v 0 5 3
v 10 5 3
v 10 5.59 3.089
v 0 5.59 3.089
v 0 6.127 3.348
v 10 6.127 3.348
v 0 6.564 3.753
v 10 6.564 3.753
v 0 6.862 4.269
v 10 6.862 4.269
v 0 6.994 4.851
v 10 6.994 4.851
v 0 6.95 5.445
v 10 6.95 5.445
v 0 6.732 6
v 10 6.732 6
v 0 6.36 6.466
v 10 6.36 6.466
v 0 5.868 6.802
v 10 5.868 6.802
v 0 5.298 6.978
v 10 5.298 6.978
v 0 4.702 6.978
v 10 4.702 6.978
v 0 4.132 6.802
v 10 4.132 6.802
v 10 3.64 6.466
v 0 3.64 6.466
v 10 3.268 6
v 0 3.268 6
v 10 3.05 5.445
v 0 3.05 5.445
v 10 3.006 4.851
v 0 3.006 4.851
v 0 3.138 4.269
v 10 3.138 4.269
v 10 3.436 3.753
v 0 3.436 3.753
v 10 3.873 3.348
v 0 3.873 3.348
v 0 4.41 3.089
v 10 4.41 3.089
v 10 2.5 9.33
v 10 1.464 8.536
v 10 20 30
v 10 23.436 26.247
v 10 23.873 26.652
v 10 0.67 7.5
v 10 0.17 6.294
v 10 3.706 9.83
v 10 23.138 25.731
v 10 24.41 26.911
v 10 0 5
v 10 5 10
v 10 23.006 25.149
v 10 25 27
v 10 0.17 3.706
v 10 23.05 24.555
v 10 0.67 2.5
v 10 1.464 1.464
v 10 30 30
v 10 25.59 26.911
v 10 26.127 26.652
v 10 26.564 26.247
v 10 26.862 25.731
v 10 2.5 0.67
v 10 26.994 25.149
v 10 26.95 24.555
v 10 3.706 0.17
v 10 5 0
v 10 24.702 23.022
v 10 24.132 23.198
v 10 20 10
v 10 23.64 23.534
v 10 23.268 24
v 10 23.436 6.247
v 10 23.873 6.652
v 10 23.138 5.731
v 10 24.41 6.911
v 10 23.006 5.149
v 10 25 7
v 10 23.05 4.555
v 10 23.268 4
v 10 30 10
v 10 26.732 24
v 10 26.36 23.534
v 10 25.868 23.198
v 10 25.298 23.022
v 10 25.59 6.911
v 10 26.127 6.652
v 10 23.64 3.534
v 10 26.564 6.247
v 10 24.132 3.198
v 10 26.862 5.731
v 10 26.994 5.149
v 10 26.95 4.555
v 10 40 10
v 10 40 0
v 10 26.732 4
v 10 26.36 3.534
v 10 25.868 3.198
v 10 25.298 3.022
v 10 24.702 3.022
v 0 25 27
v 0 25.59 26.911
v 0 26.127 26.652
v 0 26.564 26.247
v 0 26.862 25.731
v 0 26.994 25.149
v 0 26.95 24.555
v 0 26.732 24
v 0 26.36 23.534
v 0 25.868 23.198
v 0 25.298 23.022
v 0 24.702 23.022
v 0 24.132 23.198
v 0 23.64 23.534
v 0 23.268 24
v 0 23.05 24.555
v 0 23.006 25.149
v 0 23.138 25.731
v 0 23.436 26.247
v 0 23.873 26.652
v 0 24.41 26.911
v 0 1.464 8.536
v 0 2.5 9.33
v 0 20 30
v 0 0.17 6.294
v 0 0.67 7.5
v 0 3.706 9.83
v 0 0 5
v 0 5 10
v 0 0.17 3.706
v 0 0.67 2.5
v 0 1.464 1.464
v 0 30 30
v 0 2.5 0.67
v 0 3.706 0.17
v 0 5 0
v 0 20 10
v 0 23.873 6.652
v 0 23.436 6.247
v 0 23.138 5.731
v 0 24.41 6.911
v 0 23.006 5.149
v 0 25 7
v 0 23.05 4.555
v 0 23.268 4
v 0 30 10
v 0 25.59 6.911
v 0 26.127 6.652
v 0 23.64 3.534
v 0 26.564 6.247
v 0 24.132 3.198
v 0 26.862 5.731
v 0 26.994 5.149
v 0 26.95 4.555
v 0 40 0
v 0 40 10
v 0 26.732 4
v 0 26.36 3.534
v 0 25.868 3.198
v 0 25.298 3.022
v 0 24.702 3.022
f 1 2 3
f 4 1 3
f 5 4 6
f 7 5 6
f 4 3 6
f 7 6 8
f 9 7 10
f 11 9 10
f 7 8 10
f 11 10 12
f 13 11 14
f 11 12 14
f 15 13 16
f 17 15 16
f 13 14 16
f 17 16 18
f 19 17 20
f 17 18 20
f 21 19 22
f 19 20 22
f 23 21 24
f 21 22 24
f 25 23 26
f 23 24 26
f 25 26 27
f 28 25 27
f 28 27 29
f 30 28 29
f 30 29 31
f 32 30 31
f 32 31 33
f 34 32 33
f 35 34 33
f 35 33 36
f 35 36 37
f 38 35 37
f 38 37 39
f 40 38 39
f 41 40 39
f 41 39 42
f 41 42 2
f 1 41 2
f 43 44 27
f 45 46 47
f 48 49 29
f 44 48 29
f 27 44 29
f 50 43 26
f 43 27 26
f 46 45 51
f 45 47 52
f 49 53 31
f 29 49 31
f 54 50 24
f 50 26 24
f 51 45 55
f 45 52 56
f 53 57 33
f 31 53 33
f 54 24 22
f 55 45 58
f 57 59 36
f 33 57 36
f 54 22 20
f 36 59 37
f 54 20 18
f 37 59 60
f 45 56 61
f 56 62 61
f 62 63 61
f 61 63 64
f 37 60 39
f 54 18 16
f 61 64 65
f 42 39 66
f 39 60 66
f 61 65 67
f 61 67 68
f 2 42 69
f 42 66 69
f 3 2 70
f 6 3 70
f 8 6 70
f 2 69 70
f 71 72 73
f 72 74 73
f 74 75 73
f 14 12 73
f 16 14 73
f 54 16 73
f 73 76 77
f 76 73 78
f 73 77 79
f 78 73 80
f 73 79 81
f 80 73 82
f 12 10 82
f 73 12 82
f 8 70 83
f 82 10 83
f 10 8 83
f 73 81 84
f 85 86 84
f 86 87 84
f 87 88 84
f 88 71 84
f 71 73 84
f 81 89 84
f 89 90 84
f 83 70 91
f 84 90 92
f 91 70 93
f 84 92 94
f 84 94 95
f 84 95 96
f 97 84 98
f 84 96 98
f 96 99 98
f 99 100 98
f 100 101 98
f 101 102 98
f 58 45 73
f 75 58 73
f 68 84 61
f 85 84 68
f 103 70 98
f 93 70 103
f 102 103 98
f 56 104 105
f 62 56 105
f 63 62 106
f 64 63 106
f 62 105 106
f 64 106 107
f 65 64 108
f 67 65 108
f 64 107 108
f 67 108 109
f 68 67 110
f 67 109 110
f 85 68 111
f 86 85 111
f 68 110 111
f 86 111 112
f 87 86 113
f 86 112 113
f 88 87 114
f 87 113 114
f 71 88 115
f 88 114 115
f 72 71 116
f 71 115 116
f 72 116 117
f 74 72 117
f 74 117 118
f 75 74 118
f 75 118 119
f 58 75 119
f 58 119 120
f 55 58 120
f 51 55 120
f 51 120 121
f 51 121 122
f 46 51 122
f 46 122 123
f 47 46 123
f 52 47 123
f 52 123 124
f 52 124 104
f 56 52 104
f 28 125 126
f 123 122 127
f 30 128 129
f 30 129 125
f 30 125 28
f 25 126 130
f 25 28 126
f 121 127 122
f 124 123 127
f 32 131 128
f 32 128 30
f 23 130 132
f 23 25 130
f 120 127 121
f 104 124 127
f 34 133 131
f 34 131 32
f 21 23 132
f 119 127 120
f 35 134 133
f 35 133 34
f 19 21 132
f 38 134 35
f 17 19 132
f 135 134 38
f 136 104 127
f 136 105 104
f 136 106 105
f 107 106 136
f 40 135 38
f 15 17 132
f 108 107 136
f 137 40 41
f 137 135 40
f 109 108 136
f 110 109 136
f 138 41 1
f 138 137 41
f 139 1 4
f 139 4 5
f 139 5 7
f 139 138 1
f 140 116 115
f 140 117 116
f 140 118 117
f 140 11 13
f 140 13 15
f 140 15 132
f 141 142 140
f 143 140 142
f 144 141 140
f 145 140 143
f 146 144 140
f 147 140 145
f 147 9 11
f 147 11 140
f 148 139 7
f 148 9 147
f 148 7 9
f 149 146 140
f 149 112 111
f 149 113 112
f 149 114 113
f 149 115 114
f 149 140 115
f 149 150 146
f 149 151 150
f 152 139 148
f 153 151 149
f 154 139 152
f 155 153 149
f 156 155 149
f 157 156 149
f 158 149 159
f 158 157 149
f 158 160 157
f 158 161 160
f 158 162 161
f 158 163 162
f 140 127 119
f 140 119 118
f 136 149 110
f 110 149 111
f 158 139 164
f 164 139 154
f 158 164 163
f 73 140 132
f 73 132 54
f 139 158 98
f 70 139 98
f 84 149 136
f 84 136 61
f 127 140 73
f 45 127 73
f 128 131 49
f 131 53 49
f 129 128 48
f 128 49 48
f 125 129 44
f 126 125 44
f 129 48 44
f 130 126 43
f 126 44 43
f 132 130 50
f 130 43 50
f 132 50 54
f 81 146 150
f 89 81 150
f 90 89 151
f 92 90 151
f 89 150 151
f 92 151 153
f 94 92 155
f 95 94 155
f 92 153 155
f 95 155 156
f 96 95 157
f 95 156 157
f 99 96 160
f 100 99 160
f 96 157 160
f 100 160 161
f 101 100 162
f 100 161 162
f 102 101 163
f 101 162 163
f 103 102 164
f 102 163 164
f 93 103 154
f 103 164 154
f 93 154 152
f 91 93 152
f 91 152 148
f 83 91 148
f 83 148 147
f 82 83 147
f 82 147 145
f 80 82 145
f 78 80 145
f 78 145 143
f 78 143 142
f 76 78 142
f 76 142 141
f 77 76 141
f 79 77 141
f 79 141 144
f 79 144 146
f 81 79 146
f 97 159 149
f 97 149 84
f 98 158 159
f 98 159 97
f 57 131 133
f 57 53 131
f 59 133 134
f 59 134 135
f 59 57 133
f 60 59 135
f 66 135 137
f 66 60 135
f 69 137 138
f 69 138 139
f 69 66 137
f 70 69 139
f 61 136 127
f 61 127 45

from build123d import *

# Parameters (mm, degrees)
SKETCH1_W           = 10
SKETCH1_H           = 40
BOSS_EXTRUDE1_DEPTH = 10
CUT_EXTRUDE1_REACH  = 44.426
SKETCH2_R           = 2
SKETCH3_W           = 10
SKETCH3_H           = 10
BOSS_EXTRUDE2_DEPTH = 20
CUT_EXTRUDE2_REACH  = 52.99
SKETCH4_R           = 2
SKETCH5_R           = 2
CUT_EXTRUDE3_DEPTH  = 51.990195136
FILLET1_R           = 5


with BuildPart() as part:
    # Sketch1 → Boss-Extrude1 (new body)
    with BuildSketch(Plane.XY):
        with Locations((5, 20)):
            Rectangle(SKETCH1_W, SKETCH1_H)
    extrude(amount=BOSS_EXTRUDE1_DEPTH)

    # Sketch2 → Cut-Extrude1 (cut, up to next)
    with BuildSketch(Plane(origin=(10, 0, 0), x_dir=(0, 0, -1), z_dir=(1, 0, 0)), mode=Mode.PRIVATE) as cut_extrude1_sk1:
        with Locations((-5, 5)):
            Circle(SKETCH2_R)
    cut_extrude1_tool1 = extrude(cut_extrude1_sk1.sketch, amount=-CUT_EXTRUDE1_REACH, mode=Mode.PRIVATE) & part.part
    add(cut_extrude1_tool1.solids().sort_by_distance((10, 5, 5))[0], mode=Mode.SUBTRACT)

    # Sketch3 → Boss-Extrude2 (add)
    with BuildSketch(Plane.XY.offset(10)):
        with Locations((5, 25)):
            Rectangle(SKETCH3_W, SKETCH3_H)
    extrude(amount=BOSS_EXTRUDE2_DEPTH)

    # Sketch4 → Cut-Extrude2 (cut, up to next)
    with BuildSketch(Plane.ZY, mode=Mode.PRIVATE) as cut_extrude2_sk1:
        with Locations((25, 25)):
            Circle(SKETCH4_R)
    cut_extrude2_tool1 = extrude(cut_extrude2_sk1.sketch, amount=-CUT_EXTRUDE2_REACH, mode=Mode.PRIVATE) & part.part
    add(cut_extrude2_tool1.solids().sort_by_distance((0, 25, 25))[0], mode=Mode.SUBTRACT)

    # Sketch5 → Cut-Extrude3 (cut, through all)
    with BuildSketch(Plane.ZY):
        with Locations((5, 25)):
            Circle(SKETCH5_R)
    extrude(amount=-CUT_EXTRUDE3_DEPTH, mode=Mode.SUBTRACT)

    # Fillet1
    fillet1_edges = [part.edges().sort_by_distance(p)[0] for p in [
        (5, 0, 0),
        (5, 0, 10),
    ]]
    fillet(fillet1_edges, radius=FILLET1_R - 0.0001)  # a hair under: the kernel refuses the full size


solid = part.part
